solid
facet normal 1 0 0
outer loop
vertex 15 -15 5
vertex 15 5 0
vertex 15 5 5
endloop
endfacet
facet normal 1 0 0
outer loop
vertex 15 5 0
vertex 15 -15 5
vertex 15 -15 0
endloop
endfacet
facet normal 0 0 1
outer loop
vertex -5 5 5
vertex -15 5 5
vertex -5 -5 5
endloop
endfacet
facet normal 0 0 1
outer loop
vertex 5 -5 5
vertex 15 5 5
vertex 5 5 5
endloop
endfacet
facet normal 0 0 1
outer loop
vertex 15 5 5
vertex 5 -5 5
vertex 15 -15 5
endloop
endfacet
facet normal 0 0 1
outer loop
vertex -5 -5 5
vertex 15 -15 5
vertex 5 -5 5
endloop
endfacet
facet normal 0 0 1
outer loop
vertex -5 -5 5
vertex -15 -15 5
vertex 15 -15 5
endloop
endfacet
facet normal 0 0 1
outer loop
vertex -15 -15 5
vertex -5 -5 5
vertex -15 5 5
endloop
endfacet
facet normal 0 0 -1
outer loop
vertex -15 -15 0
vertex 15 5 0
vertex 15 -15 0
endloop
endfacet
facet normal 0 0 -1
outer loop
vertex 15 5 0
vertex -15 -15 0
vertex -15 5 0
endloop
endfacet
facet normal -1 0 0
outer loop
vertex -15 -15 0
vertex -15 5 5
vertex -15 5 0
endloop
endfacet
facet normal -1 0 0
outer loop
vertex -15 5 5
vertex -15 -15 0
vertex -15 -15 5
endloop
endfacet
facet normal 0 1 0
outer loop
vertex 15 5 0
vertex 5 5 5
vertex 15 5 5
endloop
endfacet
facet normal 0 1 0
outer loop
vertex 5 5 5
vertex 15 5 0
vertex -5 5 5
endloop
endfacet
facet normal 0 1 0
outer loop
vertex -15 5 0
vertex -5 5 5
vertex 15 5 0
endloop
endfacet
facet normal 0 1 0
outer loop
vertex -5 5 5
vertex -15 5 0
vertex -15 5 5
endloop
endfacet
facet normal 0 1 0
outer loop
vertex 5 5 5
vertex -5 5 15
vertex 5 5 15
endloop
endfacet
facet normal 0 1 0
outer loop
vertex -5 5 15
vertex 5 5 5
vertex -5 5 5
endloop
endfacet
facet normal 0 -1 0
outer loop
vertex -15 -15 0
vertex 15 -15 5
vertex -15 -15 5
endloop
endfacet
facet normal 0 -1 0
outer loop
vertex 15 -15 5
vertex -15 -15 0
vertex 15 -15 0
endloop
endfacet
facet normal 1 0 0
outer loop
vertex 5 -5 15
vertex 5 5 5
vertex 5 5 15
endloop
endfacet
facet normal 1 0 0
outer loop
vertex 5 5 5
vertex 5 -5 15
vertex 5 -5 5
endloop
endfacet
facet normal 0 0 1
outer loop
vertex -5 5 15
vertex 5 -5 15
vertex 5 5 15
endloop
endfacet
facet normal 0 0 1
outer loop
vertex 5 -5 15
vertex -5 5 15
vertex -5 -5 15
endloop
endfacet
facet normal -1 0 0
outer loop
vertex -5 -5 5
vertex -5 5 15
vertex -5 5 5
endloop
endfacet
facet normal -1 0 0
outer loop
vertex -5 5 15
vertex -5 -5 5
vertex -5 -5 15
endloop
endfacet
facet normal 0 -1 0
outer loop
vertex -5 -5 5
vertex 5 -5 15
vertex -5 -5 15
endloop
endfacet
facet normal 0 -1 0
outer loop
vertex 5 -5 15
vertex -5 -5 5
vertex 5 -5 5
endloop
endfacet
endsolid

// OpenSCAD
module holder(x = 0, y = 0) {
    translate([x,y,0]) {
        difference() {
            union() {
                cube([30,20,5]);
                translate([10,10,5]) cube([10,10,10]);
            }
        }
    }
}

holder(-15,-15);
